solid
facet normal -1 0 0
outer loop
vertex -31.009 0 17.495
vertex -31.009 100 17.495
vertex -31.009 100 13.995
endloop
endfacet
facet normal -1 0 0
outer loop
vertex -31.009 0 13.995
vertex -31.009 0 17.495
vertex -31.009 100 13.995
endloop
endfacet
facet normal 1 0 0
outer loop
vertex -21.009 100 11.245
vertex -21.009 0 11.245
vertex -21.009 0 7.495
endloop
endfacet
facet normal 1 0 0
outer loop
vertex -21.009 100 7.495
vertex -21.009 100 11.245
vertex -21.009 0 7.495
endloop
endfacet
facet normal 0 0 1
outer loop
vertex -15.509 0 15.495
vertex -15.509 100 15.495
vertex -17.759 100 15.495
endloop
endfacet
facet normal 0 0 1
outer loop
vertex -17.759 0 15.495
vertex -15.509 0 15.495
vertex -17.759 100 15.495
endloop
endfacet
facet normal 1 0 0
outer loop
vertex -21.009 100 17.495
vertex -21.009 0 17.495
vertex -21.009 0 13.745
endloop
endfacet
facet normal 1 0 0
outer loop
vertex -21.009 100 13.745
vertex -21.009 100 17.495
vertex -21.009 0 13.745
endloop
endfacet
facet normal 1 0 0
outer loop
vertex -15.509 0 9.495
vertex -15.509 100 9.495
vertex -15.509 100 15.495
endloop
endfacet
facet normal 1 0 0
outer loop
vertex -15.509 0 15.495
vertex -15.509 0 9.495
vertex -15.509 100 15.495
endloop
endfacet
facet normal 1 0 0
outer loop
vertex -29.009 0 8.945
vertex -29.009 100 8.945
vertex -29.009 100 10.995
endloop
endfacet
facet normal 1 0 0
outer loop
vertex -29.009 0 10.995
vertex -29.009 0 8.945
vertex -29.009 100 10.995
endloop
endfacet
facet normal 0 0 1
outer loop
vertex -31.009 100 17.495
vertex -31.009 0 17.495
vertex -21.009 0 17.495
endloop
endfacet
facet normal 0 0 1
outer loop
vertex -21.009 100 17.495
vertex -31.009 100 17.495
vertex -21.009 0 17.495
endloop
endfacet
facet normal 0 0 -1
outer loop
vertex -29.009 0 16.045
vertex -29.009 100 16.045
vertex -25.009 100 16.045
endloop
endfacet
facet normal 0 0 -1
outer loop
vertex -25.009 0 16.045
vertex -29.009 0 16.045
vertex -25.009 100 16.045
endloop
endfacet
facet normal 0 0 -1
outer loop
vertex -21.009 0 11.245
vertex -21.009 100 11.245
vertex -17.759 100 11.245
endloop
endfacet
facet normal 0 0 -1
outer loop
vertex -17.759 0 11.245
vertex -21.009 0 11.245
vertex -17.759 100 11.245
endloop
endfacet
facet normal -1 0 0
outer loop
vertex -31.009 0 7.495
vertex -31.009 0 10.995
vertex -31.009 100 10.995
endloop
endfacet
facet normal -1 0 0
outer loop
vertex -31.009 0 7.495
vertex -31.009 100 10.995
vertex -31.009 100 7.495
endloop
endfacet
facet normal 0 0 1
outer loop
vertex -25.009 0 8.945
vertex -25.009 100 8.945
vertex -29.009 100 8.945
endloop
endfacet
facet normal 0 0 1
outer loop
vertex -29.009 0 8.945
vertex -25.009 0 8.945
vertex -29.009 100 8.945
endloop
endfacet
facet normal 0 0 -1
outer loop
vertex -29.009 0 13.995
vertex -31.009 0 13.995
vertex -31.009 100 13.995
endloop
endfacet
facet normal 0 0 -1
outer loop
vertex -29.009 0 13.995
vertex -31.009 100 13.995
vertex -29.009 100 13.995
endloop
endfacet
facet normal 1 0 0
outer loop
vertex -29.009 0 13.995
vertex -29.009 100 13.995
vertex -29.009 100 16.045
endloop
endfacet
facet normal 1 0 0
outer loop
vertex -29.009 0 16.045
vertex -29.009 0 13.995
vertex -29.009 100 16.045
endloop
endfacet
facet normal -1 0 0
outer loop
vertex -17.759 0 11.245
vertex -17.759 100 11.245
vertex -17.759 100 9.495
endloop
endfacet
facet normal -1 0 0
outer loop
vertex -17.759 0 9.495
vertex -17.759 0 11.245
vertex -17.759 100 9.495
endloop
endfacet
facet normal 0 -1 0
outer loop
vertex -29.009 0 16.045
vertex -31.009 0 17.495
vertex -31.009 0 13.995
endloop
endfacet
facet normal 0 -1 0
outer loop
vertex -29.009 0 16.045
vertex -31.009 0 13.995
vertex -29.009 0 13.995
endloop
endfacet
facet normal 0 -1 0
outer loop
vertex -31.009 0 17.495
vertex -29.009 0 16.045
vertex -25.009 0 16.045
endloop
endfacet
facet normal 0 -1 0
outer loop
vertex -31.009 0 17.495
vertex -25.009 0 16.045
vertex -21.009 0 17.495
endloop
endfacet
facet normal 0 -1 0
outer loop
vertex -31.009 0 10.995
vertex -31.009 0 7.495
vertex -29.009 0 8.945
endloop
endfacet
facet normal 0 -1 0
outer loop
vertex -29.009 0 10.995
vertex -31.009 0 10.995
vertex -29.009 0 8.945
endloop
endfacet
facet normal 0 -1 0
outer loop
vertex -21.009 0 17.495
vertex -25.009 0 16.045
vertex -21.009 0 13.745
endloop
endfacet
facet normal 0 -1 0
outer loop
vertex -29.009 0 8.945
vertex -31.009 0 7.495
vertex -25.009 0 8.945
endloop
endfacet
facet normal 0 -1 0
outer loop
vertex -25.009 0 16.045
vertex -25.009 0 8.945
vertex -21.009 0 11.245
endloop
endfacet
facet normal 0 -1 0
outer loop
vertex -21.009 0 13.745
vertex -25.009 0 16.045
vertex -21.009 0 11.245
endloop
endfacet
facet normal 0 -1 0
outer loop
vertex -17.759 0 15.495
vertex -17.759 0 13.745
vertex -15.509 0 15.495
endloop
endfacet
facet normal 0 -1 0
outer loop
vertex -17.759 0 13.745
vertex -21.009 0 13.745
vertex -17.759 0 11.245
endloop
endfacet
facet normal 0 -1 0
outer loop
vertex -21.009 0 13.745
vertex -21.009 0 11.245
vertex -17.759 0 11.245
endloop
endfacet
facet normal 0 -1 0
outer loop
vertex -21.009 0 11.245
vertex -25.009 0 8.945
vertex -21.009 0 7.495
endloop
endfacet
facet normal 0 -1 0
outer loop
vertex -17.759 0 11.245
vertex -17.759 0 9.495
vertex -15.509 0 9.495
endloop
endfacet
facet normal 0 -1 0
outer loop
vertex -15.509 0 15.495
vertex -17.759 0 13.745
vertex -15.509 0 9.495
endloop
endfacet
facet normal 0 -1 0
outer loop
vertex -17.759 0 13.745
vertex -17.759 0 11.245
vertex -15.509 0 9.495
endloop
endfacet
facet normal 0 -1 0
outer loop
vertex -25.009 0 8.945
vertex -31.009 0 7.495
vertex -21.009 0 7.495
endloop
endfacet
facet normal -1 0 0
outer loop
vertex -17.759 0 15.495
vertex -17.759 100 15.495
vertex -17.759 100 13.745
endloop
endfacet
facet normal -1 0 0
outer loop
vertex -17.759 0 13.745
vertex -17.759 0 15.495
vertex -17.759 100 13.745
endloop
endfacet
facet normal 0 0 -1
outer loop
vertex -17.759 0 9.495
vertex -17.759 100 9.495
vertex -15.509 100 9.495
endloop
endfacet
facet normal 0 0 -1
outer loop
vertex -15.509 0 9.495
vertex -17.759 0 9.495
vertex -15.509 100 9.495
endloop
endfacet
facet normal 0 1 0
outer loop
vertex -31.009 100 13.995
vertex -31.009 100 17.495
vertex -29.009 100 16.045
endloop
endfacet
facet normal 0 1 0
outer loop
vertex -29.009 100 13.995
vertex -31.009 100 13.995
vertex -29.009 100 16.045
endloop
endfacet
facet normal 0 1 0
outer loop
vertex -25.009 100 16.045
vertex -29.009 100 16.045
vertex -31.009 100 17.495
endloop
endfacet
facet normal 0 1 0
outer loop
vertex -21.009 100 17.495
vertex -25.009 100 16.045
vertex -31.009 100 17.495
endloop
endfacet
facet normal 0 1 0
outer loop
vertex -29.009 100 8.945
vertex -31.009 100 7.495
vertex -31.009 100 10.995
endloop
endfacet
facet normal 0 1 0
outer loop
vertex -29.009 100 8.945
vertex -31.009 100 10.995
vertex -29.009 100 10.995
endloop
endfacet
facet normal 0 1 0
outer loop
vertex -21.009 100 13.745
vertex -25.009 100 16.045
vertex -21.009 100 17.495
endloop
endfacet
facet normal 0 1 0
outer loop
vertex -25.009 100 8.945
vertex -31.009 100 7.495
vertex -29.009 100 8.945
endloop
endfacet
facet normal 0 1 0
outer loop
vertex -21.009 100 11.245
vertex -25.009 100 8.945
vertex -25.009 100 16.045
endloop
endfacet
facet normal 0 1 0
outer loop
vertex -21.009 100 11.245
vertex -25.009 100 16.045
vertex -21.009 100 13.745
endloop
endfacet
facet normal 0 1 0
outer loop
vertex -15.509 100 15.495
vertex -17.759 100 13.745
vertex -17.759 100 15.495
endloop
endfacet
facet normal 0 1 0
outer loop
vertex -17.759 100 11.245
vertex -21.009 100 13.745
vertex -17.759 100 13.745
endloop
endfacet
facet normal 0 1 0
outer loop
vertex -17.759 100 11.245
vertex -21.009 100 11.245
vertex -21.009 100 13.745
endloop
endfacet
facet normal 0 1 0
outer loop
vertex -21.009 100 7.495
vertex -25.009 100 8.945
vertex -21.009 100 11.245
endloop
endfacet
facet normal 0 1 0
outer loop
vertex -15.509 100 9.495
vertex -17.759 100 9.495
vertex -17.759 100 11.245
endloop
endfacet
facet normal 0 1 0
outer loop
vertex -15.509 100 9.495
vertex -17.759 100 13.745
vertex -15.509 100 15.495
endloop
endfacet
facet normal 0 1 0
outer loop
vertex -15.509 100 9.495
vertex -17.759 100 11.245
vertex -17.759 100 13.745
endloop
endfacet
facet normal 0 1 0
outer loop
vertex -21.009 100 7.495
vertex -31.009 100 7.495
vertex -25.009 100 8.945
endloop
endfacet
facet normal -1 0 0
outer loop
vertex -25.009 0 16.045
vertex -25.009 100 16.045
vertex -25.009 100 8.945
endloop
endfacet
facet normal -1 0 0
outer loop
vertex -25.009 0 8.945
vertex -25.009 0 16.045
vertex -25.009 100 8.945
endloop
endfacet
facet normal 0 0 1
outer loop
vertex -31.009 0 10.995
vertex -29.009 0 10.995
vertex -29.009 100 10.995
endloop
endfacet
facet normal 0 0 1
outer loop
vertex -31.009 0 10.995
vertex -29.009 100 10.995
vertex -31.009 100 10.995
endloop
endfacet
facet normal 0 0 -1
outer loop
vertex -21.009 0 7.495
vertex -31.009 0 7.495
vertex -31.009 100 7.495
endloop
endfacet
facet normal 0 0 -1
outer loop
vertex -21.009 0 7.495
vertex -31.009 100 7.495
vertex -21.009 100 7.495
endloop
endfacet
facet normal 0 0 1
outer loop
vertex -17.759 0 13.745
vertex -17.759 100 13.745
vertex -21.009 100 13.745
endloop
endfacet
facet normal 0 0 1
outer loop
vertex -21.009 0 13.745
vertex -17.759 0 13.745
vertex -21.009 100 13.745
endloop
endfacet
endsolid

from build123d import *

# Parameters (mm, degrees)
SKETCH1_W           = 10
SKETCH1_H           = 10
BOSS_EXTRUDE2_DEPTH = 100
BOSS_EXTRUDE4_DEPTH = 100
CUT_EXTRUDE1_DEPTH  = 100


with BuildPart() as part:
    # Sketch1 → Boss-Extrude2 (new body)
    with BuildSketch(Plane(origin=(0, 0, 0), x_dir=(1, 0, 0), z_dir=(0, 1, 0))):
        with Locations((-26.008503964, -12.494851211)):
            Rectangle(SKETCH1_W, SKETCH1_H)
    extrude(amount=BOSS_EXTRUDE2_DEPTH)

    # Sketch2 → Boss-Extrude4 (add)
    with BuildSketch(Plane(origin=(0, 100, 0), x_dir=(1, 0, 0), z_dir=(0, 1, 0))):
        Polygon((-21.008503964, -11.244851211), (-17.758503964, -11.244851211), (-17.758503964, -9.494851211), (-15.508503964, -9.494851211), (-15.508503964, -15.494851211), (-17.758503964, -15.494851211), (-17.758503964, -13.744851211), (-21.008503964, -13.744851211), align=None)
    extrude(amount=-BOSS_EXTRUDE4_DEPTH)

    # Sketch3 → Cut-Extrude1 (cut)
    with BuildSketch(Plane(origin=(0, 100, 0), x_dir=(1, 0, 0), z_dir=(0, 1, 0))):
        Polygon((-31.008503964, -13.994851211), (-29.008503964, -13.994851211), (-29.008503964, -16.044851211), (-25.008503964, -16.044851211), (-25.008503964, -8.944851211), (-29.008503964, -8.944851211), (-29.008503964, -10.994851211), (-31.008503964, -10.994851211), align=None)
    extrude(amount=-CUT_EXTRUDE1_DEPTH, mode=Mode.SUBTRACT)


solid = part.part
